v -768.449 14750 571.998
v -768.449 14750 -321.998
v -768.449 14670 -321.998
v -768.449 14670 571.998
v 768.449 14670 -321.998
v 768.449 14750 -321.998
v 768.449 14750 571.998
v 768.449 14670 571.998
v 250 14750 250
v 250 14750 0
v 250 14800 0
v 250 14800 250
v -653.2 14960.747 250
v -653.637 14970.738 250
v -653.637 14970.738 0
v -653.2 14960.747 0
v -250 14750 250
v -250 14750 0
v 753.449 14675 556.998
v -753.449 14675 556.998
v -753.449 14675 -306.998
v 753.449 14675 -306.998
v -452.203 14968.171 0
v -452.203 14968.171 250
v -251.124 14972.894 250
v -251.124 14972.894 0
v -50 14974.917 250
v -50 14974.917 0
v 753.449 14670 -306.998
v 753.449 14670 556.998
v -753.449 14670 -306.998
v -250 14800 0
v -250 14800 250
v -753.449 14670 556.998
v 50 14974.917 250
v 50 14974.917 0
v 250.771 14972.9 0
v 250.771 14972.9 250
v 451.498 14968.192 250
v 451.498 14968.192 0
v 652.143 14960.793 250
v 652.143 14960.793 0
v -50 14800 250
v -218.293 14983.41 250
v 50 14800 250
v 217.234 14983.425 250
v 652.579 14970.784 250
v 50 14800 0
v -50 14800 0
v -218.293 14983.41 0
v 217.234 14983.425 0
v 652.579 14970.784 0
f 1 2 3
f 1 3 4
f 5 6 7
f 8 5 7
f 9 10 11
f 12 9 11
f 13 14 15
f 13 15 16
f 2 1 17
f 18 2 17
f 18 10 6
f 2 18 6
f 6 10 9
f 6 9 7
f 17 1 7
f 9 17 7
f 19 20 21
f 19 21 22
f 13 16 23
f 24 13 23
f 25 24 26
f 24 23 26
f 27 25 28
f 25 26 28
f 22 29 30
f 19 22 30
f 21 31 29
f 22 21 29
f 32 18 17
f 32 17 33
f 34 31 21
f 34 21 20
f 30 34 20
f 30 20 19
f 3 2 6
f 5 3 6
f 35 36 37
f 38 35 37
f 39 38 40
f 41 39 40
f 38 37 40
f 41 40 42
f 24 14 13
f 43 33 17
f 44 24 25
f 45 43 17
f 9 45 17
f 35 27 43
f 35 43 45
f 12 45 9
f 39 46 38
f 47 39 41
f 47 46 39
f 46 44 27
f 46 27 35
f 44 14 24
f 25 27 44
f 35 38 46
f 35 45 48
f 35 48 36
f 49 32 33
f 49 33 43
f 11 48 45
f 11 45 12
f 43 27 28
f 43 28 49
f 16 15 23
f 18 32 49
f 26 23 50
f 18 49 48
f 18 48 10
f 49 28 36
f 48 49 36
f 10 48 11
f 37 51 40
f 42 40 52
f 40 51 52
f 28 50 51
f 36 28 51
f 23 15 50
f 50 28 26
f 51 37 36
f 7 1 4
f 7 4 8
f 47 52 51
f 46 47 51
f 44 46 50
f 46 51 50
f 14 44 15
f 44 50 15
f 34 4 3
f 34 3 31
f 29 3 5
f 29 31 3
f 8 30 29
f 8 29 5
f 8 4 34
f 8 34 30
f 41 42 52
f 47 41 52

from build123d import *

# Parameters (mm, degrees)
F0_W     = 200
F0_H     = 50
F0_W_2   = 50
F1_DEPTH = 250
F2_W     = 1536.897368713
F2_H     = 893.9969116518
F3_DEPTH = 80
F4_W     = 1506.897368713
F4_H     = 863.9969116518
F5_DEPTH = 5


with BuildPart() as f1:
    # F0 (on Top) → F1 (new body)
    with BuildSketch(Plane.XY):
        with BuildLine():
            ThreePointArc((652.5786238231, 14970.7837516855), (-0.5294510276, 14984.9999906467), (-653.6365196693, 14970.7376004041))
            Line((-653.6365196696, 14970.7376004041), (-653.2003257959, 14960.7471181883))
            ThreePointArc((-653.200325796, 14960.7471181883), (-351.6715336626, 14970.8701194156), (-50, 14974.9165273133))
            ThreePointArc((-50, 14974.9165273133), (-25.0000348384, 14974.9791318138), (0, 14975))
            ThreePointArc((0, 14975), (25.0000348384, 14974.9791318138), (50, 14974.9165273133))
            ThreePointArc((50, 14974.9165273133), (351.1425816533, 14970.8825353534), (652.1431359193, 14960.7932386713))
            Line((652.1431359193, 14960.7932386713), (652.5786238231, 14970.7837516855))
        make_face()
        with BuildLine():
            ThreePointArc((0, 14975), (-25.0000348384, 14974.9791318138), (-50, 14974.9165273133))
            Line((-50, 14974.9165273133), (-50, 14800))
            Line((-50, 14800), (0, 14800))
            Line((0, 14800), (0, 14975))
        make_face()
        with BuildLine():
            Line((50, 14800), (50, 14974.9165273133))
            ThreePointArc((50, 14974.9165273133), (25.0000348384, 14974.9791318138), (0, 14975))
            Line((0, 14975), (0, 14800))
            Line((0, 14800), (50, 14800))
        make_face()
        with Locations((-150, 14775)):
            Rectangle(F0_W, F0_H)
        with Locations((-25, 14775)):
            Rectangle(F0_W_2, F0_H)
        with Locations((25, 14775)):
            Rectangle(F0_W_2, F0_H)
        with Locations((150, 14775)):
            Rectangle(F0_W, F0_H)
    extrude(amount=F1_DEPTH)

    # F2 (on face) → F3 (join)
    with BuildSketch(Plane.XZ.offset(-14750)):
        with Locations((0, 125)):
            Rectangle(F2_W, F2_H)
    extrude(amount=F3_DEPTH)

    # F4 (on face) → F5 (cut)
    with BuildSketch(Plane.XZ.offset(-14670)):
        with Locations((0, 125)):
            Rectangle(F4_W, F4_H)
    extrude(amount=-F5_DEPTH, mode=Mode.SUBTRACT)


solid = f1.part
